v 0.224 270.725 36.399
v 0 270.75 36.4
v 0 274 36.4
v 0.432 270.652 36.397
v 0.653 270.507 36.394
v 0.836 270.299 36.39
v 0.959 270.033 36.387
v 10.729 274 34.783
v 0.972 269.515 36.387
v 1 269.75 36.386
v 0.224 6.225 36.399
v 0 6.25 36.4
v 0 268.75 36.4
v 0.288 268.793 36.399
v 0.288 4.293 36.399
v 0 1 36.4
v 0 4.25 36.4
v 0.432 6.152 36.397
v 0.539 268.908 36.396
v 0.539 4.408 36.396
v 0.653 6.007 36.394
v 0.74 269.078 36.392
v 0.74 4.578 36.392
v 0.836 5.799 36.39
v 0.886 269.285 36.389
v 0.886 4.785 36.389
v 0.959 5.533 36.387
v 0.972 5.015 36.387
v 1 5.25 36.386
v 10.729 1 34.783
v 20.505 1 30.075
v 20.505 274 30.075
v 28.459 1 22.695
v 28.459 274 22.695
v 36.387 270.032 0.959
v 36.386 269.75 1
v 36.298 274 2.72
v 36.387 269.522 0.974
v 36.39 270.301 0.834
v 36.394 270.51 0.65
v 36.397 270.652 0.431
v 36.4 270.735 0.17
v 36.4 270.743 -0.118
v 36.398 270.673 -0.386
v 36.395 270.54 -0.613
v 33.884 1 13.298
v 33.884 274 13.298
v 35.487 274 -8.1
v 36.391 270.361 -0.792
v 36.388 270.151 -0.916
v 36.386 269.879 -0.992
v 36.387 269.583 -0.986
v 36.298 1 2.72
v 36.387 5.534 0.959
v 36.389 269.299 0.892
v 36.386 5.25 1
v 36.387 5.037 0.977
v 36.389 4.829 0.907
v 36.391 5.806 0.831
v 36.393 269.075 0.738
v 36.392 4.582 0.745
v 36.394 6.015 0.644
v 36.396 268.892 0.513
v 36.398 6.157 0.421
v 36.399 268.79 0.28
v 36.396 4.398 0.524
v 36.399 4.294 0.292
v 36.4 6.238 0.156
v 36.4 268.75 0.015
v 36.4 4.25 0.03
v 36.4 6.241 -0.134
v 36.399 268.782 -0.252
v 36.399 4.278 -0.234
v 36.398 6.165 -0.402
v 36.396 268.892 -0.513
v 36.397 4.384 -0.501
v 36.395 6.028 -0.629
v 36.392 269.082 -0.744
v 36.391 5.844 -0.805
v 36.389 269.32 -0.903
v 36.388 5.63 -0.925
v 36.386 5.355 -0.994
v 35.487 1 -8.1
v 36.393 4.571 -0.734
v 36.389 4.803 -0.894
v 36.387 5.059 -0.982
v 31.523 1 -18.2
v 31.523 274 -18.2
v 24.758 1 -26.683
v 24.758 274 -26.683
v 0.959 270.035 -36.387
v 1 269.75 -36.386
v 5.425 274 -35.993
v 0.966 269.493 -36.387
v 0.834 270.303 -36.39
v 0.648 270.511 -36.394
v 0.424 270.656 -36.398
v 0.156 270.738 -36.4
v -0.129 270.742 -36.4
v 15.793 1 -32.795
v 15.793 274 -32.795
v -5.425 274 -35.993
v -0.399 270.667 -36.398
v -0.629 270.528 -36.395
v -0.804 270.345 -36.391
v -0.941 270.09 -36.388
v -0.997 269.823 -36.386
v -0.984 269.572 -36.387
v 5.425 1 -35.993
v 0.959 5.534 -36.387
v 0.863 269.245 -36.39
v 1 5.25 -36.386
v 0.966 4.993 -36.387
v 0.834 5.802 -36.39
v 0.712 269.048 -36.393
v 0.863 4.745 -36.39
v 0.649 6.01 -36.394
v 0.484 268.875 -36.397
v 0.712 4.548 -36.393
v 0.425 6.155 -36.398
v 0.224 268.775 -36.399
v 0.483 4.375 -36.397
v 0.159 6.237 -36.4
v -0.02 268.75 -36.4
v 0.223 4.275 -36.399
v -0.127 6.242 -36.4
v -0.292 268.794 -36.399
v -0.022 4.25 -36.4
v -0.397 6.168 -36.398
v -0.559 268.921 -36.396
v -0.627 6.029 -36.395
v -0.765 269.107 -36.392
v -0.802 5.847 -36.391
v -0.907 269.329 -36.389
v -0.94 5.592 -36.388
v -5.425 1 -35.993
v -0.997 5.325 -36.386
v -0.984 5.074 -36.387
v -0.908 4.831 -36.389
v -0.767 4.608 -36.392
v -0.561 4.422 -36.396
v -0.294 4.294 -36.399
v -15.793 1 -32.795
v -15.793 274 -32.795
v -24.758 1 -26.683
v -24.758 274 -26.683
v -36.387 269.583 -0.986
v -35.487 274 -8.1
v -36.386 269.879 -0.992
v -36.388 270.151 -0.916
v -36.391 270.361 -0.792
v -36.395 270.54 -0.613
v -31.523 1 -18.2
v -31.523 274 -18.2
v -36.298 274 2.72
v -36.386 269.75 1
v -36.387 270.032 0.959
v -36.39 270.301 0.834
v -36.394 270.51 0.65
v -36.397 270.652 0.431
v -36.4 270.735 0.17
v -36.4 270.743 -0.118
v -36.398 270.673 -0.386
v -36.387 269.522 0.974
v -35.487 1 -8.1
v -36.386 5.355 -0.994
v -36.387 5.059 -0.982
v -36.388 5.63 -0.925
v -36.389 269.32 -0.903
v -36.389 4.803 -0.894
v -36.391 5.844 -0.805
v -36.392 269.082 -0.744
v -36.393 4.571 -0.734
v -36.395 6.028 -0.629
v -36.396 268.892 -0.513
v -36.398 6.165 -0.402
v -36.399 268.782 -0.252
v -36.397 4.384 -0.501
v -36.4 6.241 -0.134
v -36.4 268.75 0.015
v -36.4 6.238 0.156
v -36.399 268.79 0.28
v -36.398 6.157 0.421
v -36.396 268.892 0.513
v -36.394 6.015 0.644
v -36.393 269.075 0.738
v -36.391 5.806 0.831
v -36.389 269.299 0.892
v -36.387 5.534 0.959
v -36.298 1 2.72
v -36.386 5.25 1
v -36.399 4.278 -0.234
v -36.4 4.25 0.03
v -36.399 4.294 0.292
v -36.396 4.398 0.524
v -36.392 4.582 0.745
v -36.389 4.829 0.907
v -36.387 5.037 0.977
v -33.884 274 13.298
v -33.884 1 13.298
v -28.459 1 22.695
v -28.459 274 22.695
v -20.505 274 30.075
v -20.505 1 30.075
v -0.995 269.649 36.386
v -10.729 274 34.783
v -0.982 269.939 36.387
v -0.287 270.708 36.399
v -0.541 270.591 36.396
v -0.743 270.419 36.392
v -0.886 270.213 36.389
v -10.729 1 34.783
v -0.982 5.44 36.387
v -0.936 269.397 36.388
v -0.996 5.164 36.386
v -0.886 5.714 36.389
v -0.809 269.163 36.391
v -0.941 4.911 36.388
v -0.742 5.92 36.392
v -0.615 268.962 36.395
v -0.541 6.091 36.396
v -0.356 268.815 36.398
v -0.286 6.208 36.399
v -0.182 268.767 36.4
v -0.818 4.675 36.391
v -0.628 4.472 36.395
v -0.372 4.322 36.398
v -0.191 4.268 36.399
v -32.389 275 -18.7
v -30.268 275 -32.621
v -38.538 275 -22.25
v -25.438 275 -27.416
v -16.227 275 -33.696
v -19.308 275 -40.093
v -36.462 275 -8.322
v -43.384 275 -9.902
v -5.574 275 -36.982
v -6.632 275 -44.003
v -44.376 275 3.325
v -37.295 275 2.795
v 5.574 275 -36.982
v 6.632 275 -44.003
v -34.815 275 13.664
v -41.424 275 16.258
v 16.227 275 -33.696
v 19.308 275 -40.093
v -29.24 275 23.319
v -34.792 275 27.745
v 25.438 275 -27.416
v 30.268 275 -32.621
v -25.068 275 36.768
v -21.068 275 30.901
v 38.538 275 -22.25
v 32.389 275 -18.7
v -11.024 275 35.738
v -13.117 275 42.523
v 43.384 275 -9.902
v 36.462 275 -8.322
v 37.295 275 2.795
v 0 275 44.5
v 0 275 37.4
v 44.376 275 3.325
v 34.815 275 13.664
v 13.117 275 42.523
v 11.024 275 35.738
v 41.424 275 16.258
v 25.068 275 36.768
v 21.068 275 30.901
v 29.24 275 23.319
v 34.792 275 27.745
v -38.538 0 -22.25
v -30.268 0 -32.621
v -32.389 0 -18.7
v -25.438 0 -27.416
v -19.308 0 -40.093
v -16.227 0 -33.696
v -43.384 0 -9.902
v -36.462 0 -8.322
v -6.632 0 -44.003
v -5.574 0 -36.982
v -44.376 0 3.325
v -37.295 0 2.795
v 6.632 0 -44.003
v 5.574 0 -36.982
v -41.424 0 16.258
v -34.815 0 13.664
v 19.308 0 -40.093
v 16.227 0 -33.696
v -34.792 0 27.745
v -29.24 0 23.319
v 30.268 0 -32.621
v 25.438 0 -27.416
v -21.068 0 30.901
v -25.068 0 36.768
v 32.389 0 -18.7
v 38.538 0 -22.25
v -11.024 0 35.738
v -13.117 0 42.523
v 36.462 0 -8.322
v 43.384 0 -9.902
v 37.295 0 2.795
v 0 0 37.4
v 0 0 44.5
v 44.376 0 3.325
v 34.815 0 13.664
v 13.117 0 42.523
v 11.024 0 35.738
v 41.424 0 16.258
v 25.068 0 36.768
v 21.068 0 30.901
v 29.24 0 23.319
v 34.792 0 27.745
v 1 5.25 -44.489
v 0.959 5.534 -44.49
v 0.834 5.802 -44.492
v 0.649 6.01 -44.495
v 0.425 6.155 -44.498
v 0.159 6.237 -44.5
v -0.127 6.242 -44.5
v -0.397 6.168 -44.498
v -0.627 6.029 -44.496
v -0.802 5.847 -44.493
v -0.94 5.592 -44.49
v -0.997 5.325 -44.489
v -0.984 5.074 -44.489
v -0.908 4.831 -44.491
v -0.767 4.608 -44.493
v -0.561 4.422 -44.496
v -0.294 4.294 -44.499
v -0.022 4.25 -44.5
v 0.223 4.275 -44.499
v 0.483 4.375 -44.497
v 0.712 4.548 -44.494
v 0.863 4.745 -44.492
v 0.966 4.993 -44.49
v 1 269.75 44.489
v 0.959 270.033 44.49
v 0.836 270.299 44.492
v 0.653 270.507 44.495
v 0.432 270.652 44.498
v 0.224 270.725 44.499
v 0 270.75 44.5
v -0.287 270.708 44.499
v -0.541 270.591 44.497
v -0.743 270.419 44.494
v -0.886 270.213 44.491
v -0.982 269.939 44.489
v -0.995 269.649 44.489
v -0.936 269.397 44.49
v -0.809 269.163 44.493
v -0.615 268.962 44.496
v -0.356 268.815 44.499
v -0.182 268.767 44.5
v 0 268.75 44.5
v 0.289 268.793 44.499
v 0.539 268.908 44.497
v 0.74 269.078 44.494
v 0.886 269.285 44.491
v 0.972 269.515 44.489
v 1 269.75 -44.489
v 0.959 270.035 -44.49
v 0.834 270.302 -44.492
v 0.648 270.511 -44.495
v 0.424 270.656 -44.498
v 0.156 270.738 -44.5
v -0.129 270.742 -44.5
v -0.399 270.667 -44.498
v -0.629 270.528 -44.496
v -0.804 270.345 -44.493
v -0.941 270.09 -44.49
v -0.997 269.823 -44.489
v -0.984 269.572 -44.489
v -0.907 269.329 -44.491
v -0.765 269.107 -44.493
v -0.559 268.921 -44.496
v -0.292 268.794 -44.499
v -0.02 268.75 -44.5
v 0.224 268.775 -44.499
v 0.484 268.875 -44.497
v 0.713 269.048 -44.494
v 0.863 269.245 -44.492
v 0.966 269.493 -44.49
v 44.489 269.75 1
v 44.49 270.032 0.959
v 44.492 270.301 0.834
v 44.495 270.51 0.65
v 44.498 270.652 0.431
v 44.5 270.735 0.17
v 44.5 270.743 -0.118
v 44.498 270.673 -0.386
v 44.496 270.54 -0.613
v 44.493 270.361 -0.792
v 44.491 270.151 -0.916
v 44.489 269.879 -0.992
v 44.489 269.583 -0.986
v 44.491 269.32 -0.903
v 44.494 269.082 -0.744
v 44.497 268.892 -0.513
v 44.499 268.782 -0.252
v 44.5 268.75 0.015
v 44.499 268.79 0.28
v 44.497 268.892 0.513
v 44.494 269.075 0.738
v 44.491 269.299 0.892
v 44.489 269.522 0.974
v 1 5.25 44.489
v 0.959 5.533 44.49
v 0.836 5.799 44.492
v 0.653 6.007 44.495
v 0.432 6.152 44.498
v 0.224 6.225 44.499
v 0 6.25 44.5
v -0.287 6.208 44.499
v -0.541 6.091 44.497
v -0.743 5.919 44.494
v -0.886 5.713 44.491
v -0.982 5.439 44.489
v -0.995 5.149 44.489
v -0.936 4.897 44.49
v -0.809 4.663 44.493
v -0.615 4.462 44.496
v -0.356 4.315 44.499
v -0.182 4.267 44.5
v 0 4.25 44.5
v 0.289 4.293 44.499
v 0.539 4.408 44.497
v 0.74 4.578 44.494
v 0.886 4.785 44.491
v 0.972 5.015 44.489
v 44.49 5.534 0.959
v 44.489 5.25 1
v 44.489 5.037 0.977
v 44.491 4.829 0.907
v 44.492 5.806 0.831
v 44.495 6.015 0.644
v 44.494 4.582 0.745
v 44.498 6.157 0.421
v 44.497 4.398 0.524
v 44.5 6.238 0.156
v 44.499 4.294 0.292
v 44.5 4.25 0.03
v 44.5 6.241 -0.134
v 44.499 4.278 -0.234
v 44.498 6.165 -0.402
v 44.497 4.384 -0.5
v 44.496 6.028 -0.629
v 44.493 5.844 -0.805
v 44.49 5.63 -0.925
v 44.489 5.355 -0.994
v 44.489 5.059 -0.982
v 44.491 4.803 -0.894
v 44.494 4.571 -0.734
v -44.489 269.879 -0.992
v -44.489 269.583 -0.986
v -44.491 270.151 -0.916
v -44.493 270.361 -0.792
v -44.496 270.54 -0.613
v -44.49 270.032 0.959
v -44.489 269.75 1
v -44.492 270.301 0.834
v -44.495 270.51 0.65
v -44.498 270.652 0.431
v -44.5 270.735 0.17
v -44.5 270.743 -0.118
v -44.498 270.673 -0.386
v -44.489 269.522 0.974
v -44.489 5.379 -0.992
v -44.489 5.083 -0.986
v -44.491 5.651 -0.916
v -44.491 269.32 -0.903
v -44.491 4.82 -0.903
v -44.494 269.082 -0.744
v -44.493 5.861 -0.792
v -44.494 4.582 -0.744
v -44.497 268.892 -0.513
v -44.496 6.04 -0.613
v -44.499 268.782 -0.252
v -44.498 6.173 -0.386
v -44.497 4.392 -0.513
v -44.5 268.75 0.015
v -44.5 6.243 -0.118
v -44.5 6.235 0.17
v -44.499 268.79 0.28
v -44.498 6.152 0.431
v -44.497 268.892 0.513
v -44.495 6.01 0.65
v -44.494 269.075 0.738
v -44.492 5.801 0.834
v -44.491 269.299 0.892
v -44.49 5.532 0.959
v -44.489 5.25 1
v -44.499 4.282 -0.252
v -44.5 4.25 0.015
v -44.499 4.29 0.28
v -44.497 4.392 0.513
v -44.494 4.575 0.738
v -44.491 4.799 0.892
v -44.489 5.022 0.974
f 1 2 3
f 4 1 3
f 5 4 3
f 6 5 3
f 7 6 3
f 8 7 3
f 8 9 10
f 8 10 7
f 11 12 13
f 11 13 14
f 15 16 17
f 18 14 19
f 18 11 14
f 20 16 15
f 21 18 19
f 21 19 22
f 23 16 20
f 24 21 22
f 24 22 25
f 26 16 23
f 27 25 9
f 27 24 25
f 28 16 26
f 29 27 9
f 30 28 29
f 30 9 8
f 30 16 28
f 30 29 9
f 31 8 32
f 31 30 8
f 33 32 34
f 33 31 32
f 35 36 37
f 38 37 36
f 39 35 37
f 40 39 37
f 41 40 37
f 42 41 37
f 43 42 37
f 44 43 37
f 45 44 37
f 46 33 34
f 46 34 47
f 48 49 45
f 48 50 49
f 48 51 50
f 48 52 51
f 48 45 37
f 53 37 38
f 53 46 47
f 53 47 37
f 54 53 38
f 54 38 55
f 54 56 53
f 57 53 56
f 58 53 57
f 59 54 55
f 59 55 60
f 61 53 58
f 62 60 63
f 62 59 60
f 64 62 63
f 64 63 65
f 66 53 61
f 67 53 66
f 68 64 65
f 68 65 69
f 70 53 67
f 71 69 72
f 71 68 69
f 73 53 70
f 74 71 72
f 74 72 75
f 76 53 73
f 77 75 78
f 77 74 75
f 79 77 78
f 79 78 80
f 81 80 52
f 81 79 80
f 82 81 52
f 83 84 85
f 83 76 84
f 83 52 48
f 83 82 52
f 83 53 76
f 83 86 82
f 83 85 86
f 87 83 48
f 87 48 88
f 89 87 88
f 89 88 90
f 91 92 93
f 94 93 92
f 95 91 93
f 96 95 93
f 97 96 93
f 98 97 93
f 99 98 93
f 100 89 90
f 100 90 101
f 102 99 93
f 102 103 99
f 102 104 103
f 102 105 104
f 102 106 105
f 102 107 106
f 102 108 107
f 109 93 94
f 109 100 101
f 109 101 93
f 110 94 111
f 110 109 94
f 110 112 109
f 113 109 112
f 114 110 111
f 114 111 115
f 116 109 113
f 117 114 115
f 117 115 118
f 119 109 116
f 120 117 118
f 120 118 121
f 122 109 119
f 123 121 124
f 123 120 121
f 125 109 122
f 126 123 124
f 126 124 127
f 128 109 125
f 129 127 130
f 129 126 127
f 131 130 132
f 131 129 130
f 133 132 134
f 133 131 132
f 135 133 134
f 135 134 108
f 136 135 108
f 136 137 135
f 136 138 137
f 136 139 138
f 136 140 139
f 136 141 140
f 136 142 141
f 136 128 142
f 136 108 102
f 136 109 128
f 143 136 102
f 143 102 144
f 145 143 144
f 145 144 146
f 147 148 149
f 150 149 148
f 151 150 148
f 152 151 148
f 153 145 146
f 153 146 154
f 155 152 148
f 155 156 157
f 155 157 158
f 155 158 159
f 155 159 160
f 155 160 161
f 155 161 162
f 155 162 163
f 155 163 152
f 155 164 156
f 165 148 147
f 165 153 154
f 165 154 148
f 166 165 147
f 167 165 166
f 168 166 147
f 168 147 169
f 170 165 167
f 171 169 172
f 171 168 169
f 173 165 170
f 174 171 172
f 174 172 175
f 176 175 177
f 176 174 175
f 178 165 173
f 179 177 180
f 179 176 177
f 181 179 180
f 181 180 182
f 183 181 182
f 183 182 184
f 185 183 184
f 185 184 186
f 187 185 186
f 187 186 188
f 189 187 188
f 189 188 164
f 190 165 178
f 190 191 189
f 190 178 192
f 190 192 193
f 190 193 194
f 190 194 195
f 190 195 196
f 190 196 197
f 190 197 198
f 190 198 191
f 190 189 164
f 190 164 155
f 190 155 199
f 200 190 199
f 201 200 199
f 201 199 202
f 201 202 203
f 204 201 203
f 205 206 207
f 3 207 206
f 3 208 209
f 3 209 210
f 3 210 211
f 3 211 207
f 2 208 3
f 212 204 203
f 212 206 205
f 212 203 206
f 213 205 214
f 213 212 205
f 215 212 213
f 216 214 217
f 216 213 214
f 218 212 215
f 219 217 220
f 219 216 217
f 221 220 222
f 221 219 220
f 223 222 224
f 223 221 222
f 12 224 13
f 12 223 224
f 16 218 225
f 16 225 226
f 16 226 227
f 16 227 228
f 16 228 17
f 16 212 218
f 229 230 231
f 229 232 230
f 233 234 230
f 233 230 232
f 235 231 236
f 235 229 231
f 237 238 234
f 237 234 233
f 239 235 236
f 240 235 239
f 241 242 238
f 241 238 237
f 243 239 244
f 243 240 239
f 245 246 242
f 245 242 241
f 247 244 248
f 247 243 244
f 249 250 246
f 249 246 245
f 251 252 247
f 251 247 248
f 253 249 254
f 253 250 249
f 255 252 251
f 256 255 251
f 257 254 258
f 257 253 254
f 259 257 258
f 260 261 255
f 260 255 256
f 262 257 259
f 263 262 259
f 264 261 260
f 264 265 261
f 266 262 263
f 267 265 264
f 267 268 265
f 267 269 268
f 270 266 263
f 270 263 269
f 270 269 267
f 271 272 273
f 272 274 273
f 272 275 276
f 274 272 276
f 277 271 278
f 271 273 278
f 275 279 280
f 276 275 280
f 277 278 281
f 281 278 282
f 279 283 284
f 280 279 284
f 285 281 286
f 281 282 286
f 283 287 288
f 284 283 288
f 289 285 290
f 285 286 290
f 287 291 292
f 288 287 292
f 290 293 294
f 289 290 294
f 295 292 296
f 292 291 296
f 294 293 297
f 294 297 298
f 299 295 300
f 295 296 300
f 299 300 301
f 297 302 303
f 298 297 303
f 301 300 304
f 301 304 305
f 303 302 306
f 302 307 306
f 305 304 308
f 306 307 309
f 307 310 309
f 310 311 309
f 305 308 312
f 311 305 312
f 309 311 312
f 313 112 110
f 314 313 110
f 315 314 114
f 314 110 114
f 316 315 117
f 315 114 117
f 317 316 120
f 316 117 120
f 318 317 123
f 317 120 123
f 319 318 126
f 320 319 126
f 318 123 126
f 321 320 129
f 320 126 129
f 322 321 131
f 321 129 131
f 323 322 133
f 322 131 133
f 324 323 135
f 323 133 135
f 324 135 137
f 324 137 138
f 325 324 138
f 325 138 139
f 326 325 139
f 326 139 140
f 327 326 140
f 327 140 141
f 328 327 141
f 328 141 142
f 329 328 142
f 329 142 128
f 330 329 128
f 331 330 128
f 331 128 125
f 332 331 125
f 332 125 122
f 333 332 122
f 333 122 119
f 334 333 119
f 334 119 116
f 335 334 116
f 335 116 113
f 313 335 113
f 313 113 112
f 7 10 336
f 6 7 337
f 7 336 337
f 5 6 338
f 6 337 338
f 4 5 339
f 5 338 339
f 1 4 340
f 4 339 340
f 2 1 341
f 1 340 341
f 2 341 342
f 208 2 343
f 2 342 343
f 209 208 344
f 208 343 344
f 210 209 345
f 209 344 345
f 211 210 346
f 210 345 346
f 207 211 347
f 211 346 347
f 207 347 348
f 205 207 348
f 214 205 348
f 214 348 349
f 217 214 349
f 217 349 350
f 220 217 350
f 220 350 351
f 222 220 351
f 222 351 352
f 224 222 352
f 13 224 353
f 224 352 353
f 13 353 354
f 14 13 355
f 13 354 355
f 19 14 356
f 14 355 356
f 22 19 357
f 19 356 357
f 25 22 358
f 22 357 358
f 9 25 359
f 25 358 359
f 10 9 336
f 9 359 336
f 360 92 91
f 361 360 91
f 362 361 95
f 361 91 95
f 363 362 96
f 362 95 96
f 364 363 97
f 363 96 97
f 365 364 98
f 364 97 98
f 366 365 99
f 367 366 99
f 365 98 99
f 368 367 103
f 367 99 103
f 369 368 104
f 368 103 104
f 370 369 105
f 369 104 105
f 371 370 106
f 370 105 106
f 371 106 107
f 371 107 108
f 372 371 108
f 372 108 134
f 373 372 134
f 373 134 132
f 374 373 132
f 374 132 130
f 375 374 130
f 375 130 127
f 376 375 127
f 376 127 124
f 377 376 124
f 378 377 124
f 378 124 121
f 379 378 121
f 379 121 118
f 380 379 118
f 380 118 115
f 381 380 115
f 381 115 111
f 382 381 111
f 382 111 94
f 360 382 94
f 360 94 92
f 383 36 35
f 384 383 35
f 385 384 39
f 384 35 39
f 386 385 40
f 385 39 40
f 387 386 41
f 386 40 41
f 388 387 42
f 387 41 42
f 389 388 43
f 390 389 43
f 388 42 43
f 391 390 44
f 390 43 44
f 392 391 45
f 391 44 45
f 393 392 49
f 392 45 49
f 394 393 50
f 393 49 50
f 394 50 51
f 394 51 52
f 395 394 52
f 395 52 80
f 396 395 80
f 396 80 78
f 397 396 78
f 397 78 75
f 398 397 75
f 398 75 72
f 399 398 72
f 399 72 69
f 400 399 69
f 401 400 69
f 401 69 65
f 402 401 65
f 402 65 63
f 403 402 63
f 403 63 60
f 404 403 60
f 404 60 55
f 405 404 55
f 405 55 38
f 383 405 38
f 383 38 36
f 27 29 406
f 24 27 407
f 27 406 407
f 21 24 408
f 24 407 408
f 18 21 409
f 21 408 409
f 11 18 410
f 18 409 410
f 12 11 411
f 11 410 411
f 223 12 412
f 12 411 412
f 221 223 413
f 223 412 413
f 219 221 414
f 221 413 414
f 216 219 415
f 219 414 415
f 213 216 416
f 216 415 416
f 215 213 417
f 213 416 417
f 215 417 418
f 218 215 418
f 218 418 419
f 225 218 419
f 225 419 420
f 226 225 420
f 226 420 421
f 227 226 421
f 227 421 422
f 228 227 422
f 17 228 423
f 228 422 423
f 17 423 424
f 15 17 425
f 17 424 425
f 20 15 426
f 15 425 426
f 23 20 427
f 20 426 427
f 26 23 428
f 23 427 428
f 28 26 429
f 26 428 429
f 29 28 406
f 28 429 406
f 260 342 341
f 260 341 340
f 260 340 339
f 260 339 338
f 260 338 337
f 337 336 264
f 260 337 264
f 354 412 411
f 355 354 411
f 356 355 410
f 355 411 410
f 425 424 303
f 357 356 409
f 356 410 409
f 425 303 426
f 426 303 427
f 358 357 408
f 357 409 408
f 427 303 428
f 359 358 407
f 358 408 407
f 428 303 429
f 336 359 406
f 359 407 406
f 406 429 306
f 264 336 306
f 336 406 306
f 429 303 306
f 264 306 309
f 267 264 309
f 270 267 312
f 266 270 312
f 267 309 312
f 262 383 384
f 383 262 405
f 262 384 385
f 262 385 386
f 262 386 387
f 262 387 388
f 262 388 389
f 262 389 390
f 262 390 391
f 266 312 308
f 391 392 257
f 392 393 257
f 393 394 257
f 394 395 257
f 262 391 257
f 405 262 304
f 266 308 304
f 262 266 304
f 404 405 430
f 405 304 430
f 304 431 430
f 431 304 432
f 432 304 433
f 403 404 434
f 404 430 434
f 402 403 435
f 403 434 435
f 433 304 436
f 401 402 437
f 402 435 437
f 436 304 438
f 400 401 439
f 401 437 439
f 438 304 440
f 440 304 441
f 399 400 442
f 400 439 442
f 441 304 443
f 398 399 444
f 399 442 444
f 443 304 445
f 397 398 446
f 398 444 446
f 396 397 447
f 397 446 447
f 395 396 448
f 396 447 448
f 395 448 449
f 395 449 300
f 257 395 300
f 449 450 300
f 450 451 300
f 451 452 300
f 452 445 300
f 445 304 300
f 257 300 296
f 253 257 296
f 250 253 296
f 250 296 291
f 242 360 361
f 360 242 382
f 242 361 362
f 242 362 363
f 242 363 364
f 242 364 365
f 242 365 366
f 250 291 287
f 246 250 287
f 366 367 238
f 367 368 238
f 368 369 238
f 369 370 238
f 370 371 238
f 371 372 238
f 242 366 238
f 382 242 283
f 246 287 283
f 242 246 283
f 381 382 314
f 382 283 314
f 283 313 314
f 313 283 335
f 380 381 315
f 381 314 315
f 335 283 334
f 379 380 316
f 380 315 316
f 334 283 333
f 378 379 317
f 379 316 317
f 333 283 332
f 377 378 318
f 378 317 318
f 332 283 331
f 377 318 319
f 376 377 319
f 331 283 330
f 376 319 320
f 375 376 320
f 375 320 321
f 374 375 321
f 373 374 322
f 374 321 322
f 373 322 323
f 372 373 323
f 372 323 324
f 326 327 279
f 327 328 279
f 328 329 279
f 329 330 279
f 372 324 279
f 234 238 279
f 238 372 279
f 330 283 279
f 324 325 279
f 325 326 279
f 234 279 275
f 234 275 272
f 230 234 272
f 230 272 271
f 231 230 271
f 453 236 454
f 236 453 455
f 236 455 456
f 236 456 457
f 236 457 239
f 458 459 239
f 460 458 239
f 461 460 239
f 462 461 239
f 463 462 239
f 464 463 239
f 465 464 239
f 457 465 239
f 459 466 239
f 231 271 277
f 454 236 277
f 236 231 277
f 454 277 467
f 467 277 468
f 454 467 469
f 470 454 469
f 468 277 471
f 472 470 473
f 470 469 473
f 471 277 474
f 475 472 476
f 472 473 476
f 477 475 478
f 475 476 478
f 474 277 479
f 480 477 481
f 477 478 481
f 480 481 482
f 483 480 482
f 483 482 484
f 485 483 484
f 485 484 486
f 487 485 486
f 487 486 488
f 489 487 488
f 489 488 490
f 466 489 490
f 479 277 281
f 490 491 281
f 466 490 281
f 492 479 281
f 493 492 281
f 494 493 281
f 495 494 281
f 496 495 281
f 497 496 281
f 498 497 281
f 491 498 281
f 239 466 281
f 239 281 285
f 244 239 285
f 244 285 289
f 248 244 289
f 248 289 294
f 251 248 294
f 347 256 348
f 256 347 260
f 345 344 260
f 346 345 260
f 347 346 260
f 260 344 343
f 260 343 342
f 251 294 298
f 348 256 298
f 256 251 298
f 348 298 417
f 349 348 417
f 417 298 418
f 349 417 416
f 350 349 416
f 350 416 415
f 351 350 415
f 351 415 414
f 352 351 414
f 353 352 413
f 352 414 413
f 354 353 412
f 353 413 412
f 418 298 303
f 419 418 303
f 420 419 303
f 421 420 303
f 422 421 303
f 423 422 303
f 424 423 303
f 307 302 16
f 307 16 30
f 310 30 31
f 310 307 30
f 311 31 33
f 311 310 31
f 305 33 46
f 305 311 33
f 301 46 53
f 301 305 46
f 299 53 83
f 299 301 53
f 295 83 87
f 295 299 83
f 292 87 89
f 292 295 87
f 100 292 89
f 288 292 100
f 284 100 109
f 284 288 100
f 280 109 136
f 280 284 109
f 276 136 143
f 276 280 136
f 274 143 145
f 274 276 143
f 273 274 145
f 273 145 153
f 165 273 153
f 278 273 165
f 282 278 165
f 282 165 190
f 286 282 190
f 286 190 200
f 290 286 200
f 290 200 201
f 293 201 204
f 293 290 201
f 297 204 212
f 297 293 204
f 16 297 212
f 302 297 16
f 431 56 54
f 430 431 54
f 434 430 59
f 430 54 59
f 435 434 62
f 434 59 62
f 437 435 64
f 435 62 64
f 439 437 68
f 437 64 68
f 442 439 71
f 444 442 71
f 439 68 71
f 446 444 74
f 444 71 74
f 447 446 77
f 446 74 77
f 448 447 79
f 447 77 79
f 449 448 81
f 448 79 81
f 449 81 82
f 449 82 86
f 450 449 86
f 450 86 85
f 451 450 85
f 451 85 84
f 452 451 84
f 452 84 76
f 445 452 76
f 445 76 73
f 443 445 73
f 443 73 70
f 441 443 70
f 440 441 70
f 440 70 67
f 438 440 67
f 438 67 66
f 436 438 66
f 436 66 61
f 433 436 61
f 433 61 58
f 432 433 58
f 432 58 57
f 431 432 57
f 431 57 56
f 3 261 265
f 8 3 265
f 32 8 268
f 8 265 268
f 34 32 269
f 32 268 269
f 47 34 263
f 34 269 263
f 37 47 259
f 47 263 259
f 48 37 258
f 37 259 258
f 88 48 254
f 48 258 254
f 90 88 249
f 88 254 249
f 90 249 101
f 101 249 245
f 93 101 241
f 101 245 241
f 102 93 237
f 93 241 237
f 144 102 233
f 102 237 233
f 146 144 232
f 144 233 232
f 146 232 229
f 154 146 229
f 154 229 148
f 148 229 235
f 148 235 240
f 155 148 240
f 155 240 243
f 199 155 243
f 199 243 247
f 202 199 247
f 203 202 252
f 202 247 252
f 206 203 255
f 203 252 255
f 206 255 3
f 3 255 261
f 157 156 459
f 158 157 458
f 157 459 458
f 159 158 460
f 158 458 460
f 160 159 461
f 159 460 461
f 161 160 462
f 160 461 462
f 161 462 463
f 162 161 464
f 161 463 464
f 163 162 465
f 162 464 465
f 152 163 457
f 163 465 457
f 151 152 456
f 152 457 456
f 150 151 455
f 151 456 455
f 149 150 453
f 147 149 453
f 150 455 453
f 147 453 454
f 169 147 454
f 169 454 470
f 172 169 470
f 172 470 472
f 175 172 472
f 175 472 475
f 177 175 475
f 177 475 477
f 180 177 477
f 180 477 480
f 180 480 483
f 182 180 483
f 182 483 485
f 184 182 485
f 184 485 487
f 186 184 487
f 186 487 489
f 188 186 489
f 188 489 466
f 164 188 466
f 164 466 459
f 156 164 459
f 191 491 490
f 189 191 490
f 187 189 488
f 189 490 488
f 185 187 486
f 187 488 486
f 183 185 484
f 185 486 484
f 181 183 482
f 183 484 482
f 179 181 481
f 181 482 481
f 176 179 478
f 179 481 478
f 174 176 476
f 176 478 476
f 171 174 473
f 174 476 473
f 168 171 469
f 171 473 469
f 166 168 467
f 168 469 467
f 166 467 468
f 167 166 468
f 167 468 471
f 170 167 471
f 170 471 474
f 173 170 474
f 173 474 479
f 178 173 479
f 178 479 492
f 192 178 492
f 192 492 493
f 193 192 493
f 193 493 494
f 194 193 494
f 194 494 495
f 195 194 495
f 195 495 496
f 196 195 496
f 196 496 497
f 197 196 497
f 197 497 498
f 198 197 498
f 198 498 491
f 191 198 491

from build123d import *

# Parameters (mm, degrees)
ESBO_O1_R                = 44.5
ESBO_O1_R_2              = 36.4
RESSALTO_EXTRUS_O1_DEPTH = 275
CHANFRO1_SIZE            = 1
ESBO_O5_R                = 1
CORTE_EXTRUS_O3_DEPTH    = 293.448713452
ESBO_O13_R               = 1
CORTE_EXTRUS_O4_DEPTH    = 293.448713592


with BuildPart() as part:
    # Esboço1 → Ressalto-extrusão1 (new body)
    with BuildSketch(Plane(origin=(0, 0, 0), x_dir=(1, 0, 0), z_dir=(0, 1, 0))):
        with Locations(Location((0, 0, 0), (0, 0, 270))):
            Circle(ESBO_O1_R)
        with Locations(Location((0, 0, 0), (0, 0, 270))):
            Circle(ESBO_O1_R_2, mode=Mode.SUBTRACT)
    extrude(amount=RESSALTO_EXTRUS_O1_DEPTH)

    # Chanfro1
    chanfro1_edges = [part.edges().sort_by_distance(p)[0] for p in [
        (0, 0, -36.4),
        (0, 275, -36.4),
    ]]
    chamfer(chanfro1_edges, length=CHANFRO1_SIZE)

    # Esboço5 → Corte-extrusão3 (cut, through all)
    with BuildSketch(Plane.XY.offset(44.5)):
        with Locations((0, 269.75)):
            Circle(ESBO_O5_R)
        with Locations((0, 5.25)):
            Circle(ESBO_O5_R)
    extrude(amount=-CORTE_EXTRUS_O3_DEPTH, mode=Mode.SUBTRACT)

    # Esboço13 → Corte-extrusão4 (cut, through all)
    with BuildSketch(Plane.ZY.offset(44.5)):
        with Locations((0, 5.25)):
            Circle(ESBO_O13_R)
        with Locations((0, 269.75)):
            Circle(ESBO_O13_R)
    extrude(amount=-CORTE_EXTRUS_O4_DEPTH, mode=Mode.SUBTRACT)


solid = part.part
